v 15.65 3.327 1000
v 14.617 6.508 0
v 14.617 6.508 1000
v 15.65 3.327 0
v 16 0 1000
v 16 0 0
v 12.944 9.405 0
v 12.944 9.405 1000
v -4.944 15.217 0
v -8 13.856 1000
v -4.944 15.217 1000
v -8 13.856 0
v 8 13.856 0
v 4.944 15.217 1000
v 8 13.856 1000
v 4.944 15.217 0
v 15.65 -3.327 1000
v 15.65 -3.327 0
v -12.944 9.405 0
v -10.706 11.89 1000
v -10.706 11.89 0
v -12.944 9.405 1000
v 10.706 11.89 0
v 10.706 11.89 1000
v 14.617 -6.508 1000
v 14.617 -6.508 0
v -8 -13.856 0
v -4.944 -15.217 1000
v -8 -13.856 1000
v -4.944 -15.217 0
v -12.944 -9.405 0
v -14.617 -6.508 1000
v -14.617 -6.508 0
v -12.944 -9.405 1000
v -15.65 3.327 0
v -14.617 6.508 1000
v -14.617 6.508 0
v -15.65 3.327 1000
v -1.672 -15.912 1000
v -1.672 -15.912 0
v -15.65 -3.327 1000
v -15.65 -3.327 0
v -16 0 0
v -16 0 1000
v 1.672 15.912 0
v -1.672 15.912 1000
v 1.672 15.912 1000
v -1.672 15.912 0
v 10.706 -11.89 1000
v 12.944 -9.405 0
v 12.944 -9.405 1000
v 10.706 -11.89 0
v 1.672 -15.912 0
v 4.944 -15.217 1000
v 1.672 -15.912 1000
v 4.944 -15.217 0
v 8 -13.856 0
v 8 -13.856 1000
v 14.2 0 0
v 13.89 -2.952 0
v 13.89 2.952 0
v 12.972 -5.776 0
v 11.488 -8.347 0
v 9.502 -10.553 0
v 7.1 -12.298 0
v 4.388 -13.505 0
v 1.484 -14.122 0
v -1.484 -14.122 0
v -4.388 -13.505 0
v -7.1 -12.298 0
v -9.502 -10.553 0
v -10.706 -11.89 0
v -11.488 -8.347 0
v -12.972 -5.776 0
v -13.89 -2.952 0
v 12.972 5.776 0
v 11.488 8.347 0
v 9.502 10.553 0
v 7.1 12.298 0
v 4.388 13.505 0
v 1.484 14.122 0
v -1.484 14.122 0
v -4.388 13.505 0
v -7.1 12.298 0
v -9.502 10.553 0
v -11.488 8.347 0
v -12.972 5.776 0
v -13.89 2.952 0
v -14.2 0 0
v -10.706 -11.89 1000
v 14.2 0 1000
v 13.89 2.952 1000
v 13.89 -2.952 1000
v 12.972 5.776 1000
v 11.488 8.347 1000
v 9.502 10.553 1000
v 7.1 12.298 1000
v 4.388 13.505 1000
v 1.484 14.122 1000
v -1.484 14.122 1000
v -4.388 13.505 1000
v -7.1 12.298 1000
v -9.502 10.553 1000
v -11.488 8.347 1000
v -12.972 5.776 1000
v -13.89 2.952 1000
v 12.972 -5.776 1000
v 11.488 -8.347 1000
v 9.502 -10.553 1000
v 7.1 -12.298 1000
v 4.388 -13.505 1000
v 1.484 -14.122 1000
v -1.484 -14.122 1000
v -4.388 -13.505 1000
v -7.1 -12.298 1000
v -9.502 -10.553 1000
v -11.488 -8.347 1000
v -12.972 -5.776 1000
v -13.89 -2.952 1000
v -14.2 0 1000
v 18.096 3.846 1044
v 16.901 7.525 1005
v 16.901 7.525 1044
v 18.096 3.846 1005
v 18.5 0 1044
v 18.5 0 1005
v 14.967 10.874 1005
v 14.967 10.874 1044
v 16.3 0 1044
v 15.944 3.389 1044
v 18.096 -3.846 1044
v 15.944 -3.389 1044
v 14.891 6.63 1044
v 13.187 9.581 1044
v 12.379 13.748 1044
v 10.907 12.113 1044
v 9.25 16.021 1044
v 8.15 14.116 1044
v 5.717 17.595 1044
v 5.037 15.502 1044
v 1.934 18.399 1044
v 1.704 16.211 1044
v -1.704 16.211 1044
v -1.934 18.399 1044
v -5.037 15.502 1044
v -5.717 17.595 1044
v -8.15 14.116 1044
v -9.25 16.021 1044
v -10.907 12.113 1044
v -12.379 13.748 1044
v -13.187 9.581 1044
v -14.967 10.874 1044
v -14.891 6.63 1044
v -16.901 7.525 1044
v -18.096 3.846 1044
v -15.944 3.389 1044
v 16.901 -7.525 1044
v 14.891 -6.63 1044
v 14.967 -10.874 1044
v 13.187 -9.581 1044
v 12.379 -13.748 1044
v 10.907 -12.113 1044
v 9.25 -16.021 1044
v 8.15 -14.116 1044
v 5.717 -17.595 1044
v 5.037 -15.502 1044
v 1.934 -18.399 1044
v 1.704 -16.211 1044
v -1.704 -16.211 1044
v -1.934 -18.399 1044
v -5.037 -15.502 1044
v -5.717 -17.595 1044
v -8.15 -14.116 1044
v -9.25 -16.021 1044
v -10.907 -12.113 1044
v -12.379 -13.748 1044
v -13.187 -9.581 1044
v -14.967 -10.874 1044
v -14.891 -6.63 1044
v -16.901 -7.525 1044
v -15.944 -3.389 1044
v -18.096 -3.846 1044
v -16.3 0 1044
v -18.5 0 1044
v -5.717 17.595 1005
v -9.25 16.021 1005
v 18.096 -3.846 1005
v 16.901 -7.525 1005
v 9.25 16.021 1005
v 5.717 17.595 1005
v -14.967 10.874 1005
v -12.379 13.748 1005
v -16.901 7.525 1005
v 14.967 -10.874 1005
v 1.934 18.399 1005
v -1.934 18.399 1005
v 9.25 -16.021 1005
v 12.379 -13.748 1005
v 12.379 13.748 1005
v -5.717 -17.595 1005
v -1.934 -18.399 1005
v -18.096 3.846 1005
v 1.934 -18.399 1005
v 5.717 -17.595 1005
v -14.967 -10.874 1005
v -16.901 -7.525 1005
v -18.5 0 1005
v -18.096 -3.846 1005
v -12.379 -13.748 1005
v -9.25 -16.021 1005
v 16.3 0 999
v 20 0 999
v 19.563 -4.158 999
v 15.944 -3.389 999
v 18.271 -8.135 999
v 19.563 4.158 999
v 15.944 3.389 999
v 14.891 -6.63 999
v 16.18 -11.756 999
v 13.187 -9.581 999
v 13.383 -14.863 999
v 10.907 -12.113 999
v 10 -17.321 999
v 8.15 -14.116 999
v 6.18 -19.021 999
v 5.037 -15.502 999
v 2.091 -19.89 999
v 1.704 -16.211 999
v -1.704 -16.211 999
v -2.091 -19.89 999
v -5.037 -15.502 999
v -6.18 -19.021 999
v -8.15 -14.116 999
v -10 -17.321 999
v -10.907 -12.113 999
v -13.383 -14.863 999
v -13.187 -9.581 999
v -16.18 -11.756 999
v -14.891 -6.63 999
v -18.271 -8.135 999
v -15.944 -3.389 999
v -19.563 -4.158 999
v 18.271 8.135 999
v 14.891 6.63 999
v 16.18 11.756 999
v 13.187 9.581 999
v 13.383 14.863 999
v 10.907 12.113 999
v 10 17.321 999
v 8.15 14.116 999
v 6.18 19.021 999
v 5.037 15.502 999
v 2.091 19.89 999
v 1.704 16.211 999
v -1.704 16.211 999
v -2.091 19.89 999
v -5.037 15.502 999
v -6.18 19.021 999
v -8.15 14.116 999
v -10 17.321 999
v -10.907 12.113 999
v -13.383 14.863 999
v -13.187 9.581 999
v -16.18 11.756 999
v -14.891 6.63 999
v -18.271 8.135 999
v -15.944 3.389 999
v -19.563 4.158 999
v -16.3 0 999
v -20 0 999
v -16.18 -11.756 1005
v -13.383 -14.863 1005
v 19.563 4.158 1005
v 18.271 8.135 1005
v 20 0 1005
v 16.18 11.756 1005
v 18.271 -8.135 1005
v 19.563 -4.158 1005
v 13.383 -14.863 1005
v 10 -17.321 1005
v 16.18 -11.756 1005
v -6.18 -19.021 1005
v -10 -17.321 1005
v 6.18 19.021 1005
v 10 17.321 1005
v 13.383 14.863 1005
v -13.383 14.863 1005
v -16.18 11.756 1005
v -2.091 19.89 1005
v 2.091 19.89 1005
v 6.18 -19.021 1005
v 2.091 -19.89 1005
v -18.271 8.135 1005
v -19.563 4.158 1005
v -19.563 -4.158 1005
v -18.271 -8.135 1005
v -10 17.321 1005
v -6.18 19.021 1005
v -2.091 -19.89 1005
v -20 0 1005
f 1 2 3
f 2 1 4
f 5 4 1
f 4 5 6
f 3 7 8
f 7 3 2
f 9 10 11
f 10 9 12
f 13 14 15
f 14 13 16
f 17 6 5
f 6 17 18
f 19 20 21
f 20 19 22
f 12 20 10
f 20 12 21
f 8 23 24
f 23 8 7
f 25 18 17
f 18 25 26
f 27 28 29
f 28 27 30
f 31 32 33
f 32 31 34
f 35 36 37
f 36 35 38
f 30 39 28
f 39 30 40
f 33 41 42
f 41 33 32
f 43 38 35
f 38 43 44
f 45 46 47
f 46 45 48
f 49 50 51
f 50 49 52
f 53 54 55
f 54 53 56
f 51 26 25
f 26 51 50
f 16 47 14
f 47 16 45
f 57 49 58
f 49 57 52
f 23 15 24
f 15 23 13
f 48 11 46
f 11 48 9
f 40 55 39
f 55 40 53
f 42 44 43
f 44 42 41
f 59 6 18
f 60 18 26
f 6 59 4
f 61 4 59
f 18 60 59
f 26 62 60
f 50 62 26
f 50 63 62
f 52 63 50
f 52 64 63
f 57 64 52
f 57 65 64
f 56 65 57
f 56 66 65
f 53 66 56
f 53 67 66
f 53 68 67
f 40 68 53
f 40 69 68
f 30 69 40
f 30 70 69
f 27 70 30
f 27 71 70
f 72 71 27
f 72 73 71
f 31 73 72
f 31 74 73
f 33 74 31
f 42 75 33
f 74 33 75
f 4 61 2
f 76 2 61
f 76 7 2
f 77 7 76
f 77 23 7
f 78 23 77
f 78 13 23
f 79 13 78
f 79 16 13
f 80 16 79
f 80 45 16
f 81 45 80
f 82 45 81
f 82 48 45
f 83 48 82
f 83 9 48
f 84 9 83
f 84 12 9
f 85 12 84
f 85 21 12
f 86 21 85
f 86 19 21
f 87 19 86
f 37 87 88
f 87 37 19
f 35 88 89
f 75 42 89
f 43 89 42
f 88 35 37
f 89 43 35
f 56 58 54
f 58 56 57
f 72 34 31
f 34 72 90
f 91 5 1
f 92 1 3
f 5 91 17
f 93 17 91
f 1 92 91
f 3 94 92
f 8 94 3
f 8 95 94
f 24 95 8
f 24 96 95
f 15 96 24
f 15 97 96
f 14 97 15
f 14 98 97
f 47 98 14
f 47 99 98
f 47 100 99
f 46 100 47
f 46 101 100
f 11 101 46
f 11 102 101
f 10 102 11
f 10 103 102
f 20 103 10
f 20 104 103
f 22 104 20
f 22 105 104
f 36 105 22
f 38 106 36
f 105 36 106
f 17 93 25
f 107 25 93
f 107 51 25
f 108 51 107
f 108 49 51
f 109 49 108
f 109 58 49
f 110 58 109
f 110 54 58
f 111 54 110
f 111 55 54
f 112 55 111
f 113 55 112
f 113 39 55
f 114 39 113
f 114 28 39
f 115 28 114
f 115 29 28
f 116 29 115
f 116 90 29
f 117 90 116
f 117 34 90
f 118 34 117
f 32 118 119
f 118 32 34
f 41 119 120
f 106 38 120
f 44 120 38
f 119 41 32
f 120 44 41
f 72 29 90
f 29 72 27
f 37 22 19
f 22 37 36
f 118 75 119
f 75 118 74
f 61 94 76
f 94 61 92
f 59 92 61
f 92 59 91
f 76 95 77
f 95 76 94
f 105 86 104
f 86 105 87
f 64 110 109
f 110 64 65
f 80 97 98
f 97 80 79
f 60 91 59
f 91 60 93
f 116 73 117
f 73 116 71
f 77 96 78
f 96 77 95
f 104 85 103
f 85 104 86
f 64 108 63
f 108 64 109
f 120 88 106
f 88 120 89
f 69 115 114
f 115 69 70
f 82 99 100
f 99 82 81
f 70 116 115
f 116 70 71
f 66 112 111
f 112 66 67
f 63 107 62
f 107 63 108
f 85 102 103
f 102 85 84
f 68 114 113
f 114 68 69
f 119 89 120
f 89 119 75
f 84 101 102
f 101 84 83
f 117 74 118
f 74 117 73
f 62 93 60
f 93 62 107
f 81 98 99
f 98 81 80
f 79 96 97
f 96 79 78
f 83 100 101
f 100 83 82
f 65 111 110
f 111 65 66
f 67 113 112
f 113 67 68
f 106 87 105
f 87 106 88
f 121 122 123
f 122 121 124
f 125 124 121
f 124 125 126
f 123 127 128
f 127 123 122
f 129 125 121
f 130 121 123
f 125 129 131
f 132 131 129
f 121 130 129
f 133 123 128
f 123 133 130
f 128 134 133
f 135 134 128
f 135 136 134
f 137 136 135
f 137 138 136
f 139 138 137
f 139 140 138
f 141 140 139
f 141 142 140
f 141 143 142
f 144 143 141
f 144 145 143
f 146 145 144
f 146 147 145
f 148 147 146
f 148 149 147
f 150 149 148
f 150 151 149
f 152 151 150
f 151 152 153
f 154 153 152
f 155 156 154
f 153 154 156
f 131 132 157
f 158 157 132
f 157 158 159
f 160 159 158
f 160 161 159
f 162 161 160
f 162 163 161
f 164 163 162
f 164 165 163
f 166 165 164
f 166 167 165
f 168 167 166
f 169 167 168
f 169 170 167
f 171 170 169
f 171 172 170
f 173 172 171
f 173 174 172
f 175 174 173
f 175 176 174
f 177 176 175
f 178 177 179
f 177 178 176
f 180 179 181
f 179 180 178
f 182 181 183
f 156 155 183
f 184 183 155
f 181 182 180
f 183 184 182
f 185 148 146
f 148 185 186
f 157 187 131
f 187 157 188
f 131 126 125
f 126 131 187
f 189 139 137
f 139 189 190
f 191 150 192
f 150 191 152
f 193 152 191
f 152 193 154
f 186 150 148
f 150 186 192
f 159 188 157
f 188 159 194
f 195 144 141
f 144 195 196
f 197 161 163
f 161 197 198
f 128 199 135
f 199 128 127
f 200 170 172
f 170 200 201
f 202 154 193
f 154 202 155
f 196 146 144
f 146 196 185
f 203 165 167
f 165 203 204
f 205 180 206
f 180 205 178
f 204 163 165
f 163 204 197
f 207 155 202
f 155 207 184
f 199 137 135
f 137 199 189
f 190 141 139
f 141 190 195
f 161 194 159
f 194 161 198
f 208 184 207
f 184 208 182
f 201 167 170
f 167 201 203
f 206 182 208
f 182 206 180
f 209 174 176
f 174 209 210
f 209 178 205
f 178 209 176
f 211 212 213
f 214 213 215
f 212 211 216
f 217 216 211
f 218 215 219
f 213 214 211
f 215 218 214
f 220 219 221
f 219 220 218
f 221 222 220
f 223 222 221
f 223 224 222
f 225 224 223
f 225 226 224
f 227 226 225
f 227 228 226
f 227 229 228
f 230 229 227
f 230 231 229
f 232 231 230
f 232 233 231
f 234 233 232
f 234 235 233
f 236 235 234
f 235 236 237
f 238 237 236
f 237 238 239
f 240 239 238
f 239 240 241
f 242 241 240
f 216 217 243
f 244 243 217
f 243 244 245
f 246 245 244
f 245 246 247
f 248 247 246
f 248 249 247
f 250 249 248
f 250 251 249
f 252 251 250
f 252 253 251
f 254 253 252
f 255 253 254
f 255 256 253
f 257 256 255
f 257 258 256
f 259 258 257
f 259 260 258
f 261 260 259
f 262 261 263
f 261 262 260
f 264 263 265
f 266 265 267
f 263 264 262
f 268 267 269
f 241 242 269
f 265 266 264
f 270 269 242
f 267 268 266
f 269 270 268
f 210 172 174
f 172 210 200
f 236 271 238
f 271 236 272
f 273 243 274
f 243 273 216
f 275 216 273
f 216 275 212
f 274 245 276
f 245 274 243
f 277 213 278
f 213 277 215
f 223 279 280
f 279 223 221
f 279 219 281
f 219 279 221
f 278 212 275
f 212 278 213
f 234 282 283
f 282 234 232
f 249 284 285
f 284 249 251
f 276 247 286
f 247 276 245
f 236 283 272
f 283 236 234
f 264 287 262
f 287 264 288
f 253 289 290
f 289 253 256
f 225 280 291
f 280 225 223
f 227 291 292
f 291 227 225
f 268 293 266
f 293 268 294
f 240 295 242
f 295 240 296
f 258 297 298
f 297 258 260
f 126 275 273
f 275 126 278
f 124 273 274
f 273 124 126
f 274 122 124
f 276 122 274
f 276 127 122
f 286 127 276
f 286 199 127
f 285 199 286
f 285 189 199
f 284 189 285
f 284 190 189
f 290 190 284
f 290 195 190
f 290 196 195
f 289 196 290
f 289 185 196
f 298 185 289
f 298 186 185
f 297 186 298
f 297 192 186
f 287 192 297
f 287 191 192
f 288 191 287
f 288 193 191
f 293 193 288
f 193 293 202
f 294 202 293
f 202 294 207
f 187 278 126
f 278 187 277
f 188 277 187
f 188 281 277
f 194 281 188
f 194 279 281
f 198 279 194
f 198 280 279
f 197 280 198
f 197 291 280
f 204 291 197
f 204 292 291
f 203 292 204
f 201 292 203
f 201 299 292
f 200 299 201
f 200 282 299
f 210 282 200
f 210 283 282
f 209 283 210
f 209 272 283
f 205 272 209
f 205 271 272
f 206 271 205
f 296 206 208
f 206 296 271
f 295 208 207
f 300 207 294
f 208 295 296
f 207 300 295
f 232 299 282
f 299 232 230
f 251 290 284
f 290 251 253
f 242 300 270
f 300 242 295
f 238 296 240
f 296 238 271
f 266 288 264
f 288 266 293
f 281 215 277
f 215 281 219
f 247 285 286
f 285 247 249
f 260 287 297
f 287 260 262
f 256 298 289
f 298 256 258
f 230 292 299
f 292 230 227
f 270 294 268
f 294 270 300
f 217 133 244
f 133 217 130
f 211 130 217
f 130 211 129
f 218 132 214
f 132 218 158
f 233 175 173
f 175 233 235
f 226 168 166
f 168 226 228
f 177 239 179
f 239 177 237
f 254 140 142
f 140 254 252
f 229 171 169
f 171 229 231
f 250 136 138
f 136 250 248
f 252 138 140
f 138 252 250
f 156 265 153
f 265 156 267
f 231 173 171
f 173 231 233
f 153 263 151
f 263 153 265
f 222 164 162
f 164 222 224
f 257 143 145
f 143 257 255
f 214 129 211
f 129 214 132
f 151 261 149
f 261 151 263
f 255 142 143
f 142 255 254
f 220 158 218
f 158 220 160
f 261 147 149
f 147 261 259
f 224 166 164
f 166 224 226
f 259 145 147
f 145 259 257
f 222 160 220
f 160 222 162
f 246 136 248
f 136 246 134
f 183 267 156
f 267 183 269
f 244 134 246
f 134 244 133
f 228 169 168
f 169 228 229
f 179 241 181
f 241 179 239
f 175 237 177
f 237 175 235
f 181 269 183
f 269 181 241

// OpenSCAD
// Parameters
pipe_standard = 1; //[1:1:1]
nominal_diameter = 32; //[16:64:1]
length_mm = 1000; //[500:2000:10]
ht32_outer_diameter = 32; //[24:40:0.5]
ht32_wall_thickness = 1.8; //[1.0:3.0:0.1]
fit_socket_length = 45; //[25:80:1]
fit_socket_wall = 2.5; //[1.5:5.0:0.1]
fit_stop_ring_length = 6; //[2:15:1]
fit_stop_ring_radial = 1.5; //[0.5:4.0:0.1]
fit_inner_clearance = 0.3; //[0.0:1.0:0.05]
connect_overlap = 1; //[0.5:2:0.1]

// Module for the HT Pipe
module ht_pipe() {
  color([0.85, 0.85, 0.8]) {
    // Hollow tube body
    difference() {
      cylinder(r=ht32_outer_diameter/2, h=length_mm, center=false);
      translate([0, 0, -connect_overlap])
        cylinder(r=ht32_outer_diameter/2 - ht32_wall_thickness, h=length_mm + 2*connect_overlap, center=false);
    }
    
    // End fitting
    difference() {
      union() {
        // Socket outer
        translate([0, 0, length_mm - connect_overlap])
          cylinder(r=ht32_outer_diameter/2 + fit_socket_wall, h=fit_socket_length, center=false);
        // Stop ring outer
        translate([0, 0, length_mm - connect_overlap])
          cylinder(r=ht32_outer_diameter/2 + fit_socket_wall + fit_stop_ring_radial, h=fit_stop_ring_length, center=false);
      }
      // Socket inner void
      translate([0, 0, length_mm - connect_overlap - connect_overlap])
        cylinder(r=ht32_outer_diameter/2 + fit_inner_clearance, h=fit_socket_length + 2*connect_overlap, center=false);
    }
  }
}

// Assembly
module assembly() {
  ht_pipe();
}

assembly();
